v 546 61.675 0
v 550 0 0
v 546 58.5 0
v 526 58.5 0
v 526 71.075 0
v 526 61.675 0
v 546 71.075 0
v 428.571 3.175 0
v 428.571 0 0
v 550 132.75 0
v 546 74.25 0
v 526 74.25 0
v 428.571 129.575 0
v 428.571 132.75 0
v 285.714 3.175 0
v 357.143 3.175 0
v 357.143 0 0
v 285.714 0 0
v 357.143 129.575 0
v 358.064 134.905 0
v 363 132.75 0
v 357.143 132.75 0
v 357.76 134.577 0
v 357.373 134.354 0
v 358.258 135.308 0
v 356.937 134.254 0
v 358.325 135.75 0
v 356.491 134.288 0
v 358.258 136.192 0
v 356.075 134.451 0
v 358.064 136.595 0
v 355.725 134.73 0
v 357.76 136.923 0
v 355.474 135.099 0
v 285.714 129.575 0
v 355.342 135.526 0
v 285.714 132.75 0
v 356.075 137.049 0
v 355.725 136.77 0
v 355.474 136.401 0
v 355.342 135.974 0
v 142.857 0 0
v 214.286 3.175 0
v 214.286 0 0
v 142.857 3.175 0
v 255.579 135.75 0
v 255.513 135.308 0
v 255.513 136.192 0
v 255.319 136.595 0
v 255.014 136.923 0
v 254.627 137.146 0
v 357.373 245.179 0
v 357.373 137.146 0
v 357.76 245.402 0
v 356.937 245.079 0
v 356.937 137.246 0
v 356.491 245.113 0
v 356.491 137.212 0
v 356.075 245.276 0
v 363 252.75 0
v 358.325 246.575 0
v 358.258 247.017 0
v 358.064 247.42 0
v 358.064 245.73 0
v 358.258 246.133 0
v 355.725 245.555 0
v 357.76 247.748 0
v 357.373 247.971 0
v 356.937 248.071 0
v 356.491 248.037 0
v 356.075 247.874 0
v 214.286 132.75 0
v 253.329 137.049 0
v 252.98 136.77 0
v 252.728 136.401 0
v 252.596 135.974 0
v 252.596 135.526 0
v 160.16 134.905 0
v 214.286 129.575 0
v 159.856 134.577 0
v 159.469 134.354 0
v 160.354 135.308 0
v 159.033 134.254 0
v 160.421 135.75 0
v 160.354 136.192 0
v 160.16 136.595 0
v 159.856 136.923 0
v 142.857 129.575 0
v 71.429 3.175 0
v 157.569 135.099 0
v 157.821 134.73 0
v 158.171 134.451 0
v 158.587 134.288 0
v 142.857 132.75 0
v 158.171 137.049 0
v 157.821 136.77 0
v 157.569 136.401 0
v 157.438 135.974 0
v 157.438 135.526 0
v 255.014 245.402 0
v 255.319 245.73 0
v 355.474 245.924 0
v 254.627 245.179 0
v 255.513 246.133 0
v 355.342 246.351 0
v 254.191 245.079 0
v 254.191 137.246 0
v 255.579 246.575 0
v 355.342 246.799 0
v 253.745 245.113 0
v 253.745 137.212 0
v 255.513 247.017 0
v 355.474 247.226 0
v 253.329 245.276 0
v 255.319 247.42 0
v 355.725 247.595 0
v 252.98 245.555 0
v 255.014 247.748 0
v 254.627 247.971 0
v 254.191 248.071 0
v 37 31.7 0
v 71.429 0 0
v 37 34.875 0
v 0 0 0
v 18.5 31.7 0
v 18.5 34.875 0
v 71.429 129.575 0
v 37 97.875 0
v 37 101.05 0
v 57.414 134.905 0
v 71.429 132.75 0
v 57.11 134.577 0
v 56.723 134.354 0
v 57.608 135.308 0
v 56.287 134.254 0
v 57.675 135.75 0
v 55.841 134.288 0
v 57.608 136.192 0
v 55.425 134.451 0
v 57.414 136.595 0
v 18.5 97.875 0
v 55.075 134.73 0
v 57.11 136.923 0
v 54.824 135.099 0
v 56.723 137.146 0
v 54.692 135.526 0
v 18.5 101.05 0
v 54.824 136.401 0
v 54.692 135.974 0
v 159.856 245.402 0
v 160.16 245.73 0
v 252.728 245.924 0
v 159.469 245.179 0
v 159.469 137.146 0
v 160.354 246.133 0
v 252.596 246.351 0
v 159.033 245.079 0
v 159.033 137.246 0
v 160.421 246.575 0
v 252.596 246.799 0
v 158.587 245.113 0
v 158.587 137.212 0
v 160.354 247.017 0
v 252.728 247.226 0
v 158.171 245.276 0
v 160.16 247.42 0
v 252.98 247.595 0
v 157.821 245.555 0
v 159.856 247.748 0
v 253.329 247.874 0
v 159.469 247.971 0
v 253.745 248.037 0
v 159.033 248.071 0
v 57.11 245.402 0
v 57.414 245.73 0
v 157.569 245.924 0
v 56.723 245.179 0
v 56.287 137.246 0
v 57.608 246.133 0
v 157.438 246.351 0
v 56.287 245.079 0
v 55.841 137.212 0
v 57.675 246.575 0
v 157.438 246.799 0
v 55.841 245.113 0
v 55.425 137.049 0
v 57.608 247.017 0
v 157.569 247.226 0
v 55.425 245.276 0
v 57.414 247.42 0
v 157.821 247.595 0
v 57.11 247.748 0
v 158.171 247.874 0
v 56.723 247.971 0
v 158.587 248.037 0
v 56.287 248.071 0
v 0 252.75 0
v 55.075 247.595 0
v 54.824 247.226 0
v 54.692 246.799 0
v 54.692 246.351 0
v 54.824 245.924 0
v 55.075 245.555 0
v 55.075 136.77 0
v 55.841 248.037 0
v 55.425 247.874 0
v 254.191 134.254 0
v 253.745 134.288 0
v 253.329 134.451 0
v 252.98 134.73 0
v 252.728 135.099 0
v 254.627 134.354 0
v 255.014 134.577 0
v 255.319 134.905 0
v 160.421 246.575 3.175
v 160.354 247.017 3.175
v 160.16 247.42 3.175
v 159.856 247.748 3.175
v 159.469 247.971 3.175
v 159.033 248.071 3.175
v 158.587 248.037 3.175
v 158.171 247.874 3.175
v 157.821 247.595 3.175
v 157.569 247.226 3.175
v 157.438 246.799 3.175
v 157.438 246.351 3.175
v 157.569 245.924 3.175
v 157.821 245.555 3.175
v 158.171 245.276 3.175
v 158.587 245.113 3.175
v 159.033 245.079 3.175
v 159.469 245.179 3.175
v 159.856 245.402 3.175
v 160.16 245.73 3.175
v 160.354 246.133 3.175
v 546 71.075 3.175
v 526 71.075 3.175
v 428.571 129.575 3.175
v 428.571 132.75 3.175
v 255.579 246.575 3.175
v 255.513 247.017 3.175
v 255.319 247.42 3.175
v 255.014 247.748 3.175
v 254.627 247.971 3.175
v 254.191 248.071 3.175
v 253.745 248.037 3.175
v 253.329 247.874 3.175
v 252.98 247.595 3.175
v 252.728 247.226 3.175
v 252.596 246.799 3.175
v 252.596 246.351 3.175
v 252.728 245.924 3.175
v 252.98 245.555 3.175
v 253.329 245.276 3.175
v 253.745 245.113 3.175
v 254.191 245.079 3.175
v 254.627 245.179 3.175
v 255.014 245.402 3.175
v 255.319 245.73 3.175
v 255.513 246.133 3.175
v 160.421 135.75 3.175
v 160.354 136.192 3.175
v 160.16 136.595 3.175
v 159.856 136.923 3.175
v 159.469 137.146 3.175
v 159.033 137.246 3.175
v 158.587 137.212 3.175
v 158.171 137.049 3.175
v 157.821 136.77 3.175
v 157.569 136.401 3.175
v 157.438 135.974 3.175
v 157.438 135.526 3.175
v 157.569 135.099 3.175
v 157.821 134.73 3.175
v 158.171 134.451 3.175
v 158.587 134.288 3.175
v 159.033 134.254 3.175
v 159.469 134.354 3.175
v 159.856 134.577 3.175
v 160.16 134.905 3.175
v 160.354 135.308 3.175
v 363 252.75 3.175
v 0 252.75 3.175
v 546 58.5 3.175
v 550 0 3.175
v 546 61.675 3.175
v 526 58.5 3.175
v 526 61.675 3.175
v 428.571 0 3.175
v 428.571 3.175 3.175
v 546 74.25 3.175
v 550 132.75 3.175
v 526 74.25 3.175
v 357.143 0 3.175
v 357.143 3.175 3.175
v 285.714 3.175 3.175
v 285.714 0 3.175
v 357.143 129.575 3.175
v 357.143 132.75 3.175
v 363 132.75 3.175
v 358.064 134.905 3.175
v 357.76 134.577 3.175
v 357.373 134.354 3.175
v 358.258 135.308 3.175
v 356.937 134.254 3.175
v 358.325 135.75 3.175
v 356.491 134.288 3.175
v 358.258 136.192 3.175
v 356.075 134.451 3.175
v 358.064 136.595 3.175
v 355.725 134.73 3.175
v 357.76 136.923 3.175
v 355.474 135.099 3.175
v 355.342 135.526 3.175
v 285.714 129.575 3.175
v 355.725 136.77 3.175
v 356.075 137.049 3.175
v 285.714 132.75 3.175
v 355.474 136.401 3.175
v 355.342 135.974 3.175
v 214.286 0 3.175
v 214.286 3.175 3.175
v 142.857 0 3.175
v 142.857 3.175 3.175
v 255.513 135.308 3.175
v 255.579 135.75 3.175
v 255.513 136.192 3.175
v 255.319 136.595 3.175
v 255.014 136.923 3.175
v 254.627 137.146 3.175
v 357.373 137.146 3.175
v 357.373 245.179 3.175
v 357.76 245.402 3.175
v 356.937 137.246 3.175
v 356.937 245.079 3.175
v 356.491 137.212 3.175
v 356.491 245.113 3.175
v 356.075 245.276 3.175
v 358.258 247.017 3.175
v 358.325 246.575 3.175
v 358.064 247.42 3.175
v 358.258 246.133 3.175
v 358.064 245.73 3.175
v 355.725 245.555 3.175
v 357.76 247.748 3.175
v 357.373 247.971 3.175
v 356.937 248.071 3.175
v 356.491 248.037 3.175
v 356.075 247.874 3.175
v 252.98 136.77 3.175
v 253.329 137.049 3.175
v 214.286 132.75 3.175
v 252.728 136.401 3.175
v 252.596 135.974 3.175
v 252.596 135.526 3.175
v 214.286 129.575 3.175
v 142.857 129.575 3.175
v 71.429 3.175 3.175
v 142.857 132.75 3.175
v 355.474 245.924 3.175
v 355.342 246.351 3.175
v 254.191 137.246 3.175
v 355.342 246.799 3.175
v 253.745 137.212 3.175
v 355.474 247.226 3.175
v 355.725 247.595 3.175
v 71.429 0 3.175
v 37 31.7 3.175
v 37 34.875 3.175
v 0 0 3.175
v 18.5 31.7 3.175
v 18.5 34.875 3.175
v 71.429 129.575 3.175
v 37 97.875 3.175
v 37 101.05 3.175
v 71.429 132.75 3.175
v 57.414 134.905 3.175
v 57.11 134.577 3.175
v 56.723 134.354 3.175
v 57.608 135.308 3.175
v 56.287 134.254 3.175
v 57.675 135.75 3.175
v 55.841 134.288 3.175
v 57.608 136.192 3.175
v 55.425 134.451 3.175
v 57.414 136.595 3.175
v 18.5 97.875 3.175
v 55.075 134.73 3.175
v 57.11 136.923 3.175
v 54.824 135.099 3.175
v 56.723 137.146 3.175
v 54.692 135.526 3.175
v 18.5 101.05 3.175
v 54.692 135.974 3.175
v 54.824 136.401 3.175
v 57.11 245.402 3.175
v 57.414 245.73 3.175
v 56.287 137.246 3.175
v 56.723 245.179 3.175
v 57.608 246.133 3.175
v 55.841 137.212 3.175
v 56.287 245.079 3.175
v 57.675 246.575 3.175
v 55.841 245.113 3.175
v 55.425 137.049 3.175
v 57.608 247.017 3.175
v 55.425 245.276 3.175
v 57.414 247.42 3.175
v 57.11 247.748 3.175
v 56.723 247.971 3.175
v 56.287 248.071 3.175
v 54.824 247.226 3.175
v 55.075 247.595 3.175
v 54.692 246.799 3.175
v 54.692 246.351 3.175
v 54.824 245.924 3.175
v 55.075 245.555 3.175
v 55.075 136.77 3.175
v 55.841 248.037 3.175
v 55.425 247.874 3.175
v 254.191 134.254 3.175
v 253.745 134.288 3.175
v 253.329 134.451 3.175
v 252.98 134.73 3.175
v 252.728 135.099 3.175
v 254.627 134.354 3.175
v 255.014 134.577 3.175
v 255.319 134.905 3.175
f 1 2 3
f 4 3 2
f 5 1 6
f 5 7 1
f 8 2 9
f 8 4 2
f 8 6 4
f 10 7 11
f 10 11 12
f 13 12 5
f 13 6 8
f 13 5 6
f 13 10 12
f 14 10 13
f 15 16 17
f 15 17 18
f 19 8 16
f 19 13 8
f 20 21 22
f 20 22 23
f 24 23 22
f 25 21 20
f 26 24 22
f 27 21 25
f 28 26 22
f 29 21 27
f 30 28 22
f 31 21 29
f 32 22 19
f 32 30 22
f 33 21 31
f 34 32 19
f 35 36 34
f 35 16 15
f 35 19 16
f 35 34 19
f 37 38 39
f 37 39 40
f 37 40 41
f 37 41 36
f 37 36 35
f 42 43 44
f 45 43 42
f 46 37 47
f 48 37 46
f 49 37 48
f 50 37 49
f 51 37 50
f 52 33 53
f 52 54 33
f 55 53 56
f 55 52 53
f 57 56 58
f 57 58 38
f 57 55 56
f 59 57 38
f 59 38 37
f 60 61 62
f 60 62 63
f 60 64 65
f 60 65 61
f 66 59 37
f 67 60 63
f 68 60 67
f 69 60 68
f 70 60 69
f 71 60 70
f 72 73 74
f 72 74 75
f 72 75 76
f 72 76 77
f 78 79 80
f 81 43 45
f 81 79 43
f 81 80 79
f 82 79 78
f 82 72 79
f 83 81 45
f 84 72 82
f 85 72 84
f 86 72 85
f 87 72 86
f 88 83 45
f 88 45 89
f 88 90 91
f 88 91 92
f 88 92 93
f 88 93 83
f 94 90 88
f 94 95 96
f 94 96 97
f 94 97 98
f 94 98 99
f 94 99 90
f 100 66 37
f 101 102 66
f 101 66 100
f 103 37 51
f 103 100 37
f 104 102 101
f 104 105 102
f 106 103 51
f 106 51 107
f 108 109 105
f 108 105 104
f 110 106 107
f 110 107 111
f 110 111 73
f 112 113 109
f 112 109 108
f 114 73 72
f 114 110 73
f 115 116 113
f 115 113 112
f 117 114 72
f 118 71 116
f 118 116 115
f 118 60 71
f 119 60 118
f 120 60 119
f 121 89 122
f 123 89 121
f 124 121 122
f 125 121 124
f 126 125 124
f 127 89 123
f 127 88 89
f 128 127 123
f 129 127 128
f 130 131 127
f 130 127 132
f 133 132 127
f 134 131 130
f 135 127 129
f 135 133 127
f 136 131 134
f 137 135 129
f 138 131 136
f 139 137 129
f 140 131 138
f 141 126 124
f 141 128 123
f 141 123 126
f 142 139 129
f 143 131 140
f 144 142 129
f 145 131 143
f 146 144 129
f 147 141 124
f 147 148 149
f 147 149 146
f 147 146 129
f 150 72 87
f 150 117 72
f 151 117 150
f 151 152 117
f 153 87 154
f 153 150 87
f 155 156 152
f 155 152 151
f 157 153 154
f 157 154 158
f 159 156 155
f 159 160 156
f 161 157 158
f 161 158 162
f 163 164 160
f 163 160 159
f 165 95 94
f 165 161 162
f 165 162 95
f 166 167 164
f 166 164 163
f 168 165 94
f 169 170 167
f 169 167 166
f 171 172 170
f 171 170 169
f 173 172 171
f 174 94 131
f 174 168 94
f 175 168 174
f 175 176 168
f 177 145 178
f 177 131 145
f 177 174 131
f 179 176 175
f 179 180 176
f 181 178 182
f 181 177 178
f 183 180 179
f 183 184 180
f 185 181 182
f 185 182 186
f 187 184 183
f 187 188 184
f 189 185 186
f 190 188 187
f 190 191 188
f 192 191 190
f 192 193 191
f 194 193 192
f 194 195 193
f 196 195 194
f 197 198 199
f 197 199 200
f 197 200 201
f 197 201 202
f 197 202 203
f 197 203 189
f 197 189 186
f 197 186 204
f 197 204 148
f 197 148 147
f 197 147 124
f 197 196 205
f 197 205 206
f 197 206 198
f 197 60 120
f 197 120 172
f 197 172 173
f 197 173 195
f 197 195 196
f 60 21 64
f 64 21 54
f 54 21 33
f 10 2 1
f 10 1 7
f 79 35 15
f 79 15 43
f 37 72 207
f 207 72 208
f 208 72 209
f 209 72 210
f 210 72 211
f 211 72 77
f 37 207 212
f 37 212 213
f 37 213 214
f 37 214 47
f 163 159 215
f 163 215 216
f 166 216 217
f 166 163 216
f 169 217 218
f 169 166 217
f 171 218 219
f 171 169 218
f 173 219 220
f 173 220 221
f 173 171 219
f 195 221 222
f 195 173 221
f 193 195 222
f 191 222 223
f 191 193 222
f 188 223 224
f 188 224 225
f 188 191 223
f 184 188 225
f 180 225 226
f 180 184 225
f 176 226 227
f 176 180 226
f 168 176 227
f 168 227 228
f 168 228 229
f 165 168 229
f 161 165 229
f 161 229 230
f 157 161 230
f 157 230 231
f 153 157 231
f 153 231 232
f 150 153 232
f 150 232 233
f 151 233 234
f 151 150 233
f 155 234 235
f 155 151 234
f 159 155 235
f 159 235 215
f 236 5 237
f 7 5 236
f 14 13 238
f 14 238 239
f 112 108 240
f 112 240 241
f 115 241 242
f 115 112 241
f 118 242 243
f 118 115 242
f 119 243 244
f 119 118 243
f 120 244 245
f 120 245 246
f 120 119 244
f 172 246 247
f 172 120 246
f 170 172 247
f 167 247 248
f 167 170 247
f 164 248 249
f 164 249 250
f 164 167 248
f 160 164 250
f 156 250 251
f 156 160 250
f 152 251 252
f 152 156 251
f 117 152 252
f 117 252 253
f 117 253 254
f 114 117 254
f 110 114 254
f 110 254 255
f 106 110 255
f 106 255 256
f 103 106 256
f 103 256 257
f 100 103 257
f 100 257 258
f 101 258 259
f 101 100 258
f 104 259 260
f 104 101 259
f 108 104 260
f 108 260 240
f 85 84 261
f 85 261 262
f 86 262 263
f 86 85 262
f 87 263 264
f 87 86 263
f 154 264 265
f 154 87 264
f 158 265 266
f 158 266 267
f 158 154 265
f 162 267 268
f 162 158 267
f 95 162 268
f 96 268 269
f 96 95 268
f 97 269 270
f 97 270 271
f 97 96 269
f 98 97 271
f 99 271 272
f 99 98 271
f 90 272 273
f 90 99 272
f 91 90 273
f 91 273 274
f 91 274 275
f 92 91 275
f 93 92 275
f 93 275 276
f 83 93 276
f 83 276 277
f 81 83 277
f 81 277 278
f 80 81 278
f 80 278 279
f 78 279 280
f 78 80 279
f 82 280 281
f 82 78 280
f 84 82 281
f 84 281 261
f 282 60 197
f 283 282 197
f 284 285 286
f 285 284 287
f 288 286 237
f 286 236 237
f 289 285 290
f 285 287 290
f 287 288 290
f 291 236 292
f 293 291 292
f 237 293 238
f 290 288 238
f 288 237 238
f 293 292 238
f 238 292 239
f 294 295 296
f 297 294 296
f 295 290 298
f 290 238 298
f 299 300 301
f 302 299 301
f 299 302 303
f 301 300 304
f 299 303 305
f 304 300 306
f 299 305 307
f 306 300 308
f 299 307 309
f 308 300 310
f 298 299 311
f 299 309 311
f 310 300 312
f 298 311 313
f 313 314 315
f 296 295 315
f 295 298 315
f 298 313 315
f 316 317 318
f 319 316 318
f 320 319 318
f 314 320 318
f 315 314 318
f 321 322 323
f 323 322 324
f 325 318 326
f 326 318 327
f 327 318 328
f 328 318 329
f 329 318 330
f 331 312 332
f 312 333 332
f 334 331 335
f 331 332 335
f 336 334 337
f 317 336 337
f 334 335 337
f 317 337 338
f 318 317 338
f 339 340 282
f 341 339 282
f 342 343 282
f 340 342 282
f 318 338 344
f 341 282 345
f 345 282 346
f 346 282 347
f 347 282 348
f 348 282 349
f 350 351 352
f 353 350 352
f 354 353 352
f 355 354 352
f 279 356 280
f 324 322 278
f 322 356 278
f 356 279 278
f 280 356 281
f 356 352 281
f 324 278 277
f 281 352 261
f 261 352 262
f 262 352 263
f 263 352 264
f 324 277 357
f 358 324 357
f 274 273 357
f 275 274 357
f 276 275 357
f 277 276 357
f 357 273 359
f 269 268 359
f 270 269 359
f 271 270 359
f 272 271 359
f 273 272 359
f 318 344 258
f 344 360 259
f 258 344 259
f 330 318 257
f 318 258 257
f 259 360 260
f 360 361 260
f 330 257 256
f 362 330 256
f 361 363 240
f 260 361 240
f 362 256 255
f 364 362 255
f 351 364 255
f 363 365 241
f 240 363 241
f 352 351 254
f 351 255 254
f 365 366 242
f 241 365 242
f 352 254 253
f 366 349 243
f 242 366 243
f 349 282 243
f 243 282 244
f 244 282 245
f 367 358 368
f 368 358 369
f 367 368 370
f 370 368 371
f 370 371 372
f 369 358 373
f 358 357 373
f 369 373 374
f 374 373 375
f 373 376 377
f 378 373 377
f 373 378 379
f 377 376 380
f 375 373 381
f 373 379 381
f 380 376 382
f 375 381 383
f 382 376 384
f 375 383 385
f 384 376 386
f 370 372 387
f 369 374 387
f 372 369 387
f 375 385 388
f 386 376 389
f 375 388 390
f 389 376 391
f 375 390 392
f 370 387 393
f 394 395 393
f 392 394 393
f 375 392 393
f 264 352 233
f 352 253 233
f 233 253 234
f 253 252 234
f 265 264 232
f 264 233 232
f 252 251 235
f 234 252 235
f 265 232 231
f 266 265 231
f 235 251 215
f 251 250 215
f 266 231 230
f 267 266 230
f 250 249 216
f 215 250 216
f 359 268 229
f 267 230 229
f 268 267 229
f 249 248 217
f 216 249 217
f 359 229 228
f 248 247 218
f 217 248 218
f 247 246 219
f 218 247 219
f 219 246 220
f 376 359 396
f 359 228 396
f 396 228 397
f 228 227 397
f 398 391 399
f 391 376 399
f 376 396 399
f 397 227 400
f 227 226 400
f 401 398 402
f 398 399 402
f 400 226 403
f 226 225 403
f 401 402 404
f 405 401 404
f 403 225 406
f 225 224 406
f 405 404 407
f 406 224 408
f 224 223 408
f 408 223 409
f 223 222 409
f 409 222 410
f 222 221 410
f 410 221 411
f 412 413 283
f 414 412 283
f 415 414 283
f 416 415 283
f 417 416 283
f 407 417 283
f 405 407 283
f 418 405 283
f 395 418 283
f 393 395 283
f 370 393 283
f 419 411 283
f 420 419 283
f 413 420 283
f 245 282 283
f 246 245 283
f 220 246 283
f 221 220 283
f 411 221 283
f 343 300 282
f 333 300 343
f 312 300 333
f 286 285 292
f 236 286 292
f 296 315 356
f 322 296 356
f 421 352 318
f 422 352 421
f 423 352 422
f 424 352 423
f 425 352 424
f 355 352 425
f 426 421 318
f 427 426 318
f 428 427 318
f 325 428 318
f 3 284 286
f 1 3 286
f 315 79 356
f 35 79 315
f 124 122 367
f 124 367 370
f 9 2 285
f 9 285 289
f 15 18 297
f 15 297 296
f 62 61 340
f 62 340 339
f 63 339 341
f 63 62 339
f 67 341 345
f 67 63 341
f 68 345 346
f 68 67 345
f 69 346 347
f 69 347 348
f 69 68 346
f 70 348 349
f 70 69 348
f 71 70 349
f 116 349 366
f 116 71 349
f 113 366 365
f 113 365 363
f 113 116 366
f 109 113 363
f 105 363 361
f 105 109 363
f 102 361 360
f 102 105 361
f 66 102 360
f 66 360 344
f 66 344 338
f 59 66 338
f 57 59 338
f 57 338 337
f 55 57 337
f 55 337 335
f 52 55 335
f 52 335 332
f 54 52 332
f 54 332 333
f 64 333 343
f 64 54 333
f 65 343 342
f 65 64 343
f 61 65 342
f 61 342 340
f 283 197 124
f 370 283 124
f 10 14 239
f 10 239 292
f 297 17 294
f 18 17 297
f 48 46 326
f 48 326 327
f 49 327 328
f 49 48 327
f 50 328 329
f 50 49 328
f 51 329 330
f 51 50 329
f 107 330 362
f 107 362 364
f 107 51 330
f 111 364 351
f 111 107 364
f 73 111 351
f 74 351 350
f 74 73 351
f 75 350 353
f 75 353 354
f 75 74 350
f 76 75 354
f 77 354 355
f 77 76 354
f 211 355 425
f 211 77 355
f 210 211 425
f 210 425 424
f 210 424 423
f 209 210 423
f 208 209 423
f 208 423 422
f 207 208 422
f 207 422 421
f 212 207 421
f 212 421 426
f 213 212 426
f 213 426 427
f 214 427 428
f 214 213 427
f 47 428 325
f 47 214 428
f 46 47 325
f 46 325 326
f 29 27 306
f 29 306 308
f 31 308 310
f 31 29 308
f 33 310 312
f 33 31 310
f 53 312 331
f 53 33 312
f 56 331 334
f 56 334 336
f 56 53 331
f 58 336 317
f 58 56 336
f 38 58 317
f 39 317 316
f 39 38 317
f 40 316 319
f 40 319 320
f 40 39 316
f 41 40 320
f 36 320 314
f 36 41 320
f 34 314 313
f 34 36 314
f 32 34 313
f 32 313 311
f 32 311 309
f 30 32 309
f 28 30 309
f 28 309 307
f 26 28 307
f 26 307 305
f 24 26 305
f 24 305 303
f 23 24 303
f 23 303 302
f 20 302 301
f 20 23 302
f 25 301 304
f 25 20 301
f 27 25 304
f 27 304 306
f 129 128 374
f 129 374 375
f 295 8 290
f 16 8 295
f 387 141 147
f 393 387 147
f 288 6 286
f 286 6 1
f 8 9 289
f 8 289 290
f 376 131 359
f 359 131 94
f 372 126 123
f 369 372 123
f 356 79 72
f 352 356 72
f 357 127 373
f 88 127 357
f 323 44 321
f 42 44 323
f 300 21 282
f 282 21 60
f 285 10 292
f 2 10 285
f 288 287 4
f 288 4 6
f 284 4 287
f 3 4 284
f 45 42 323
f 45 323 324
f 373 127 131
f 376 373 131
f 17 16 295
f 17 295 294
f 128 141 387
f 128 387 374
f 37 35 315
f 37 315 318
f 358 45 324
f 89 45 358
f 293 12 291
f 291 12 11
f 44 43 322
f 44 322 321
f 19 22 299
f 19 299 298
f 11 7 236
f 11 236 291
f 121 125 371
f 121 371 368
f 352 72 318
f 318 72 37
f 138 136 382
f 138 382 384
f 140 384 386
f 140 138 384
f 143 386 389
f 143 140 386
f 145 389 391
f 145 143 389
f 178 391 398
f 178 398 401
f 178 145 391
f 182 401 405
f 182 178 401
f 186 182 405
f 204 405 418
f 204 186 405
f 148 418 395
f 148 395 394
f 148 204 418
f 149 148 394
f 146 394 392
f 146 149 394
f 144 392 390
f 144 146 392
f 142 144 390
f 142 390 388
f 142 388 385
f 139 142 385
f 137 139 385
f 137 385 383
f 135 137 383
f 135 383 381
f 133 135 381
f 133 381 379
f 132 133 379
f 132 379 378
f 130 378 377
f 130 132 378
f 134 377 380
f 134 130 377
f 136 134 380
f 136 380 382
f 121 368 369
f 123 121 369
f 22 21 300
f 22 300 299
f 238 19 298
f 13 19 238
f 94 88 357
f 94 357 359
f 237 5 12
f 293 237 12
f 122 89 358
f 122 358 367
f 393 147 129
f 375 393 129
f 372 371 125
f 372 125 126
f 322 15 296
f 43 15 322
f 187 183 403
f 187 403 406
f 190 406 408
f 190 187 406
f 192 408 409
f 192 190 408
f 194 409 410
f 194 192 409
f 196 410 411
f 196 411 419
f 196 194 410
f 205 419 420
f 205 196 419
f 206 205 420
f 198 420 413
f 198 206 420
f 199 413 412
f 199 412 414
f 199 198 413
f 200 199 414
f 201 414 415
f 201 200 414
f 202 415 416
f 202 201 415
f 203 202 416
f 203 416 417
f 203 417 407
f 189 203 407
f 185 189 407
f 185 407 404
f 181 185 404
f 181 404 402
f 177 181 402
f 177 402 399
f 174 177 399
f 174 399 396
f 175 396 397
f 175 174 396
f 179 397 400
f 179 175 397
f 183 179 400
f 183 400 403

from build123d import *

# Parameters (mm, degrees)
SKETCH1_R           = 1.5
SKETCH1_W           = 71.428571428
SKETCH1_H           = 3.175
SKETCH1_W_2         = 20
SKETCH1_W_3         = 18.5
BOSS_EXTRUDE1_DEPTH = 3.175


with BuildPart() as part:
    # Sketch1 → Boss-Extrude1 (new body)
    with BuildSketch(Plane.XY):
        Polygon((0, 0), (0, 132.75), (0, 252.75), (328.222222222, 252.75), (363, 252.75), (363, 228.115), (363, 132.75), (357.142857143, 132.75), (357.142857143, 129.575), (428.571428571, 129.575), (428.571428571, 132.75), (550, 132.75), (550, 0), (428.571428571, 0), (428.571428571, 3.175), (357.142857143, 3.175), (357.142857143, 0), (285.714285714, 0), (285.714285714, 3.175), (214.285714286, 3.175), (214.285714286, 0), (142.857142857, 0), (142.857142857, 3.175), (71.428571429, 3.175), (71.428571429, 0), align=None)
        with Locations((56.175, 246.575)):
            Circle(SKETCH1_R, mode=Mode.SUBTRACT)
        with Locations((158.920833333, 135.75)):
            Circle(SKETCH1_R, mode=Mode.SUBTRACT)
        with Locations((158.920833333, 246.575)):
            Circle(SKETCH1_R, mode=Mode.SUBTRACT)
        with Locations((254.079166667, 246.575)):
            Circle(SKETCH1_R, mode=Mode.SUBTRACT)
        with Locations((254.079166667, 135.75)):
            Circle(SKETCH1_R, mode=Mode.SUBTRACT)
        with Locations((356.825, 135.75)):
            Circle(SKETCH1_R, mode=Mode.SUBTRACT)
        with Locations((356.825, 246.575)):
            Circle(SKETCH1_R, mode=Mode.SUBTRACT)
        with Locations((56.175, 135.75)):
            Circle(SKETCH1_R, mode=Mode.SUBTRACT)
        with Locations((107.142857143, 131.1625)):
            Rectangle(SKETCH1_W, SKETCH1_H, mode=Mode.SUBTRACT)
        with Locations((250, 131.1625)):
            Rectangle(SKETCH1_W, SKETCH1_H, mode=Mode.SUBTRACT)
        with Locations((536, 60.0875)):
            Rectangle(SKETCH1_W_2, SKETCH1_H, mode=Mode.SUBTRACT)
        with Locations((536, 72.6625)):
            Rectangle(SKETCH1_W_2, SKETCH1_H, mode=Mode.SUBTRACT)
        with Locations((27.75, 33.2875)):
            Rectangle(SKETCH1_W_3, SKETCH1_H, mode=Mode.SUBTRACT)
        with Locations((27.75, 99.4625)):
            Rectangle(SKETCH1_W_3, SKETCH1_H, mode=Mode.SUBTRACT)
    extrude(amount=BOSS_EXTRUDE1_DEPTH)


solid = part.part
